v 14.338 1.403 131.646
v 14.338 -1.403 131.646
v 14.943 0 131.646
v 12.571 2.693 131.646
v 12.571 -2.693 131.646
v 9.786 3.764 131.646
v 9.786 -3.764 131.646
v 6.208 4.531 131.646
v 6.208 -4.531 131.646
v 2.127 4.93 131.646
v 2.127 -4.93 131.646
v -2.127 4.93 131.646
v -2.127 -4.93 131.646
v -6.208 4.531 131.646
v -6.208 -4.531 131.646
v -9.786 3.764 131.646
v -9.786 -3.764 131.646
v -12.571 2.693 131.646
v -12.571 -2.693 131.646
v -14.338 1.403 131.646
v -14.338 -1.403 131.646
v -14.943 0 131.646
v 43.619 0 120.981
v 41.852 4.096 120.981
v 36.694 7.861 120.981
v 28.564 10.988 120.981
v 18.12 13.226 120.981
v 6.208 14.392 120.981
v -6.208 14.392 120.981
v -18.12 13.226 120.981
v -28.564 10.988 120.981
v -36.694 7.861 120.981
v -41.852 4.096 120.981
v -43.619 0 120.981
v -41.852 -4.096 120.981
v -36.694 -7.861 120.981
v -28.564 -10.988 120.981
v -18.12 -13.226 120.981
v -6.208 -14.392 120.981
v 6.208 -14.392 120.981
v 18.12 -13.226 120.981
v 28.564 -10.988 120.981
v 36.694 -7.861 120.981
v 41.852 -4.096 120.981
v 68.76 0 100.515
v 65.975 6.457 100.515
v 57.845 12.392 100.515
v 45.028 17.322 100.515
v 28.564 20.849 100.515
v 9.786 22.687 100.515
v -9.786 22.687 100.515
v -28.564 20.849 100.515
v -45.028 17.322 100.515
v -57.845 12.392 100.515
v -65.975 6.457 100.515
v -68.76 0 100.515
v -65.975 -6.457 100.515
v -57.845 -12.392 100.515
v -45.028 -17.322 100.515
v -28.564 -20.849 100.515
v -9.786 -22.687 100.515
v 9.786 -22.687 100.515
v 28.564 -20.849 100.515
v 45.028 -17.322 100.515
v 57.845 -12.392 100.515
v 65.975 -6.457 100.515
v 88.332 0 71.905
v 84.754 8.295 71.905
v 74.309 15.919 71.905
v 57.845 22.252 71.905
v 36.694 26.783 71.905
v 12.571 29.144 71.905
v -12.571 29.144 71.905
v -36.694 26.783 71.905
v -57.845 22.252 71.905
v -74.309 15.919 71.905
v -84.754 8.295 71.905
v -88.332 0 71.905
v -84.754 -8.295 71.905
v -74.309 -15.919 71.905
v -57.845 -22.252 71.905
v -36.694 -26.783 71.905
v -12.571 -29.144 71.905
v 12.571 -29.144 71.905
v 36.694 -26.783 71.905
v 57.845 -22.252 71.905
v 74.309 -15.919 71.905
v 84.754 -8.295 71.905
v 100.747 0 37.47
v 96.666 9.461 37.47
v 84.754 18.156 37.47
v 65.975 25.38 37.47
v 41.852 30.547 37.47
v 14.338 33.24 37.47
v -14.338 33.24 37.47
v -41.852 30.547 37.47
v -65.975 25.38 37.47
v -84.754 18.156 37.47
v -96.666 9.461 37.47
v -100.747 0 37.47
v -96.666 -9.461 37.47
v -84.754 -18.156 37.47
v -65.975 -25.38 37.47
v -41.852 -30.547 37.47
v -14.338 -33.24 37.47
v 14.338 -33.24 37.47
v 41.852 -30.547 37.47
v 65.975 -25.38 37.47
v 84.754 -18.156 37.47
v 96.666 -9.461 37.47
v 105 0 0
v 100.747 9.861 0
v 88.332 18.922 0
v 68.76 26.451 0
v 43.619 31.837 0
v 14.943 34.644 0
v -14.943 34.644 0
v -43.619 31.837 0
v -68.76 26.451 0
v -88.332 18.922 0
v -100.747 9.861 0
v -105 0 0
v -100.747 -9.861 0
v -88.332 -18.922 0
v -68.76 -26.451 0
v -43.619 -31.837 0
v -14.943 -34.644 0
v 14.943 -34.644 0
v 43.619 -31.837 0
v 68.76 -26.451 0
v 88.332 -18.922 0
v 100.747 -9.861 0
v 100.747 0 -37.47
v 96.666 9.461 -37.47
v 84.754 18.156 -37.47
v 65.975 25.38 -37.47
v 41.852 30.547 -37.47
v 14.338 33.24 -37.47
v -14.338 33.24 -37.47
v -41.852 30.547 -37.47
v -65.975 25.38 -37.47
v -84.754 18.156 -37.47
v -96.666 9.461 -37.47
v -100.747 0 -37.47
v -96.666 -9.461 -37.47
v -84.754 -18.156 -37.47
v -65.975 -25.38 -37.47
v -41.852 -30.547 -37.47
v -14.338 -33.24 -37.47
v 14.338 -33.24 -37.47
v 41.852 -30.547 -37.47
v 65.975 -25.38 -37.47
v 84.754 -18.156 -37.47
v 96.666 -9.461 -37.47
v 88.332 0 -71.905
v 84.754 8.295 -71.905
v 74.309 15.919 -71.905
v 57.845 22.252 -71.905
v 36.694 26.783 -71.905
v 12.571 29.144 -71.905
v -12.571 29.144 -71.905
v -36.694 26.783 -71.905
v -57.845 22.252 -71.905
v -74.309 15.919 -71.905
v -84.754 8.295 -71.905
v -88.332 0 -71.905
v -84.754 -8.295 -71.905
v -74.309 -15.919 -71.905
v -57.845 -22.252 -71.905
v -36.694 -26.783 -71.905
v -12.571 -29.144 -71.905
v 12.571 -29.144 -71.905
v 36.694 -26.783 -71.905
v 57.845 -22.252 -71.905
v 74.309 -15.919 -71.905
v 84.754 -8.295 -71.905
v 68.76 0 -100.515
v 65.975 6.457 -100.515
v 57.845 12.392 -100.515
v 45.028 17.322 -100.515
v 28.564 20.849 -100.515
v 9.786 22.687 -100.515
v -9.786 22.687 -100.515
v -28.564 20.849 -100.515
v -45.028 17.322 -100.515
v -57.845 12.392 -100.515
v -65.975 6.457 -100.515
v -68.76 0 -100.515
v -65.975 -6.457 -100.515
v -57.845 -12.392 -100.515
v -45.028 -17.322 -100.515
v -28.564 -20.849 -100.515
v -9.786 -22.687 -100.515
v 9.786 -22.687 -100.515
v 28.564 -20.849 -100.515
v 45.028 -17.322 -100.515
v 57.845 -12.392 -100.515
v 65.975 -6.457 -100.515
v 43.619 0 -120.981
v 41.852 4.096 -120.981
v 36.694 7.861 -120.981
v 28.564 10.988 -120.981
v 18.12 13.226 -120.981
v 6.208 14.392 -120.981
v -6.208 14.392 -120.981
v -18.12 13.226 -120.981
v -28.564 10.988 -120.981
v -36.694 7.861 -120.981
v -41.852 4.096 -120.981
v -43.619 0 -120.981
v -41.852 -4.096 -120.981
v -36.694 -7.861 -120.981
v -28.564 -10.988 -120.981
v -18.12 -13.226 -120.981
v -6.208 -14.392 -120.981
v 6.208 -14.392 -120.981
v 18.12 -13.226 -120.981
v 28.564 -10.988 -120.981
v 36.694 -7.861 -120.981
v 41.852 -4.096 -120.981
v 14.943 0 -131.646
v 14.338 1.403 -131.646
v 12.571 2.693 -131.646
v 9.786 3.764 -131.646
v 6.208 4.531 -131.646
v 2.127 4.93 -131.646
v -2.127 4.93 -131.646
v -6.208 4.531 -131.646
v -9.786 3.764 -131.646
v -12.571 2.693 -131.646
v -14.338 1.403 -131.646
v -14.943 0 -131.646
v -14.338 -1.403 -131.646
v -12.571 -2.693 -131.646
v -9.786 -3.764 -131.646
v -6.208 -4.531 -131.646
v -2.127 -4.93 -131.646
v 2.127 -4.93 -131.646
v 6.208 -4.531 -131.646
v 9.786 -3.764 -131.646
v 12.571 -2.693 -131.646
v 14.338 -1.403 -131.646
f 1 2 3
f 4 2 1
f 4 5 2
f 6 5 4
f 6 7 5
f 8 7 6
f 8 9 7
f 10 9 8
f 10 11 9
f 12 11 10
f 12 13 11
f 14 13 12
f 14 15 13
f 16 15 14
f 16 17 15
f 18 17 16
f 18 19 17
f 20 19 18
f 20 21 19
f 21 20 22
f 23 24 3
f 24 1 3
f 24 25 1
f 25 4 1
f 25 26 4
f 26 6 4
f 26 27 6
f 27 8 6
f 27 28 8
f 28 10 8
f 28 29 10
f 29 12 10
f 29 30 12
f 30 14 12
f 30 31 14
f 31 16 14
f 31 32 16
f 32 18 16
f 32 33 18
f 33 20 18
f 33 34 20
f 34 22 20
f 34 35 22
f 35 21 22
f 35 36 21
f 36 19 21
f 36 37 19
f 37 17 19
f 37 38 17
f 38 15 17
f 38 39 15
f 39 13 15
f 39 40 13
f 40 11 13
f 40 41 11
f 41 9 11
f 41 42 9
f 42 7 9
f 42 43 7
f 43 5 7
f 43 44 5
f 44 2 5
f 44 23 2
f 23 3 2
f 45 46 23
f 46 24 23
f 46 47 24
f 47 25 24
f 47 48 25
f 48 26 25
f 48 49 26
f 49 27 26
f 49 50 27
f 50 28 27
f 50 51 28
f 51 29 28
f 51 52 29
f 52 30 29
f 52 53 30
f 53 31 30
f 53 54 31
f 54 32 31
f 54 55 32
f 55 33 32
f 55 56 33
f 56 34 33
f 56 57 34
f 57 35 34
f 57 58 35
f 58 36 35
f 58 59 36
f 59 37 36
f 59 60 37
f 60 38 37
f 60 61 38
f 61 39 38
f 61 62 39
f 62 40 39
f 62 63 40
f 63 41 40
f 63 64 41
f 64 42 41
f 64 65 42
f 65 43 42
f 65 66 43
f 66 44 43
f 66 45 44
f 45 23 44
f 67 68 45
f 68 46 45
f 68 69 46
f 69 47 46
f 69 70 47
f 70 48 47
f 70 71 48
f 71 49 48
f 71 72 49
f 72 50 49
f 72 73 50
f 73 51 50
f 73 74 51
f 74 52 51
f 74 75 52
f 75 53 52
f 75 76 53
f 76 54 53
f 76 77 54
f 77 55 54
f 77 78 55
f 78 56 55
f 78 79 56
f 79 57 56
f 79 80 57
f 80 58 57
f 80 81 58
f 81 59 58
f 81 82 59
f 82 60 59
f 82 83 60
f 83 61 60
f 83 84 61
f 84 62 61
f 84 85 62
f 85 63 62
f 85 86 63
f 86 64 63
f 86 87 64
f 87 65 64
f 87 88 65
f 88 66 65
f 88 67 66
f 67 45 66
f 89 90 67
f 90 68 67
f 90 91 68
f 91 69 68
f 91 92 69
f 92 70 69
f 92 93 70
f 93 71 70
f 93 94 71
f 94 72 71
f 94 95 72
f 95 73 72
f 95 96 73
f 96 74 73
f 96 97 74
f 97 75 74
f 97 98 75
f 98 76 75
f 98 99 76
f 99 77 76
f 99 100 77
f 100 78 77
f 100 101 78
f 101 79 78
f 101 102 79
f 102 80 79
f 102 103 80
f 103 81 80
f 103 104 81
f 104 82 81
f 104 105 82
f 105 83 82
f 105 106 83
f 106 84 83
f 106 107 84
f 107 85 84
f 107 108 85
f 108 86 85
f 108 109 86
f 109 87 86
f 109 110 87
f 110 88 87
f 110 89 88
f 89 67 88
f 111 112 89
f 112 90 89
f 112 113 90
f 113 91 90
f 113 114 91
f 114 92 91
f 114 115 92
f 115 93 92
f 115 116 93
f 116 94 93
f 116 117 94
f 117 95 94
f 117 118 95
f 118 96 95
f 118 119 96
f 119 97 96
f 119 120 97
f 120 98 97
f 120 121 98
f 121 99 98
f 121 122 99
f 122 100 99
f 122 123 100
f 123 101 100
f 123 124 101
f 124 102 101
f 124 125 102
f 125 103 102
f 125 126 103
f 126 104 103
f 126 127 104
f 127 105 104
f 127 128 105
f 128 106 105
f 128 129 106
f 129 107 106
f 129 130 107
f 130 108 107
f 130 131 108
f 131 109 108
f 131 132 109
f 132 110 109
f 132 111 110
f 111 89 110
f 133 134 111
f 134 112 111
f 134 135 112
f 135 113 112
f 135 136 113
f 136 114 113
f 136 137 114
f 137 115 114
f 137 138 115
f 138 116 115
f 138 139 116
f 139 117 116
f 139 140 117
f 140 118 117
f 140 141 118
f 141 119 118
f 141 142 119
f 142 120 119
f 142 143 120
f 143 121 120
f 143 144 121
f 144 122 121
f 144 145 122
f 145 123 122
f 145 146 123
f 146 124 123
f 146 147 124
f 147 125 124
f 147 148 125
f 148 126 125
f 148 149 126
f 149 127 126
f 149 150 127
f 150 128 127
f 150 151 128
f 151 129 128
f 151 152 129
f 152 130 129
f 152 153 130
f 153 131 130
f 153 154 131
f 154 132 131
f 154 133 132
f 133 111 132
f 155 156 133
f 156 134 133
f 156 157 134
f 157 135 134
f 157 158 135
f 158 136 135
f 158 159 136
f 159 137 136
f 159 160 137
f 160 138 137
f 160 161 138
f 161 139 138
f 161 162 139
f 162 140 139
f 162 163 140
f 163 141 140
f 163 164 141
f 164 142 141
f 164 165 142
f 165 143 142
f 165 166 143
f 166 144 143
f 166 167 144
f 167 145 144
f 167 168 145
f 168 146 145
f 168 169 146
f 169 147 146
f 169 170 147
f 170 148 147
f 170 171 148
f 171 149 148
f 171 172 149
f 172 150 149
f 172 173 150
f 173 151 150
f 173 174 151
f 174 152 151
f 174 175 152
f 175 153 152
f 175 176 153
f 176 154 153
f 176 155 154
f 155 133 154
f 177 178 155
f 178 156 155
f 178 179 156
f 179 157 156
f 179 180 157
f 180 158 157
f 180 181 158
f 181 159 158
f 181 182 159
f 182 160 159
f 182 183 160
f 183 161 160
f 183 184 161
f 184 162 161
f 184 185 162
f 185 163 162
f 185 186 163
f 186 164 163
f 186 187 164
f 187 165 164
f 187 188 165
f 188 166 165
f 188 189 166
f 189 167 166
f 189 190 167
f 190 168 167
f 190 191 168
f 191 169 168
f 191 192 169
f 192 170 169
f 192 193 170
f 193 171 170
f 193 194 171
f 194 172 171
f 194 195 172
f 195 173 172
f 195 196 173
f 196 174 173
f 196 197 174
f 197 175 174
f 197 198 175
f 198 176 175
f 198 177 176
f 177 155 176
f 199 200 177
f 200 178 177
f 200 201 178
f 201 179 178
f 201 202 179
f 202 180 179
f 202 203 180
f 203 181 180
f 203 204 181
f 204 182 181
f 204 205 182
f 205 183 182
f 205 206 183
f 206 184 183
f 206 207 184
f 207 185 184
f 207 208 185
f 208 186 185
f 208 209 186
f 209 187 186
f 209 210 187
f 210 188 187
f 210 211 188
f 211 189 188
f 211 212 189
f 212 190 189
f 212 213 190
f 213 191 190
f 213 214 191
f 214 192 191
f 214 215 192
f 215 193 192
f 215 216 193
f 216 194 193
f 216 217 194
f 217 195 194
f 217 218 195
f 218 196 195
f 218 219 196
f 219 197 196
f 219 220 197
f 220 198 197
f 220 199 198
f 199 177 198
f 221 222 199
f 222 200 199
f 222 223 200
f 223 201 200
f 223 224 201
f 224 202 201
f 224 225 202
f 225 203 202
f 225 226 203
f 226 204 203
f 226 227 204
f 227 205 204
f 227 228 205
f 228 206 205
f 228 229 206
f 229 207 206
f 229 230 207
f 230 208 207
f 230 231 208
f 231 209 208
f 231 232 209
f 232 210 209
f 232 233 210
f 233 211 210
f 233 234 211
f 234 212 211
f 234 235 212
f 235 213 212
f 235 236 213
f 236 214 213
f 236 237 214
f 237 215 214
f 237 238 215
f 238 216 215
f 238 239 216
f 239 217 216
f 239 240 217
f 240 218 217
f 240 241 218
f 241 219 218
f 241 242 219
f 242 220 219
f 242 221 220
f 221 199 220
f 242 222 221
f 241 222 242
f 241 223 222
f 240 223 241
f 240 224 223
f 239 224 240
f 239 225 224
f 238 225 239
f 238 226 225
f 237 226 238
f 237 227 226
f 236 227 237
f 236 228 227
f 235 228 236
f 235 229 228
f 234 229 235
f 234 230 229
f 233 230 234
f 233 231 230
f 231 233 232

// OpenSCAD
// Generated by SolidPython 1.0.1 on 2020-07-29 00:46:51


scale(v = [15, 5, 19]) {
	sphere(r = 7);
}
/***********************************************
*********      SolidPython code:      **********
************************************************
 
# import packages: SolidPython
from solid import *
from solid.utils import *
from itertools import chain, combinations, permutations


class Resize:

    def __init__(self, scad_file):
        self.scad_file = scad_file
        #self.scad_file = import_scad(scad_file)
        # cone/cylinder param:
        self.r1 = 0
        self.r2 = 0
        self.h = 0
        # rectangular prism param:
        self.w = 0
        self.l = 0
        # ellipse param:
        self.r = 0

    # import OpenScad code (file name corresponds to shape)


    # classify shape + parameters
    def assign(self, param1, param2, param3):
        if self.scad_file == 'cone.scad':
            self.r1 = param1
            self.r2 = param2
            self.h = param3
        elif self.scad_file == 'cylinder.scad':
            self.r1 = param1
            self.r2 = param2
            self.h = param3
        elif self.scad_file == 'rectangularPrism.scad':
            self.h = param1
            self.l = param2
            self.w = param3
        else:
            self.r = param1
            self.h = param2

    # resize parameters
    def iterate(self):
        x = range(3, 20, 2)
        i = 1
        if self.scad_file == 'cone.scad':
            tempList = list(permutations(x, 2))
            for temp in tempList:
                param1 = temp[0]
                param2 = temp[1]
                filepath = 'produced_scad_files/' + 'cone' + str(param1) + '_' + str(param2) + '_' + '.scad'
                scad_render_to_file(cylinder(h=param1, r1=param2, r2=0), filepath)

        elif self.scad_file == 'cylinder.scad':
            tempList = list(permutations(x, 3))
            for temp in tempList:
                param1 = temp[0]
                param2 = temp[1]
                filepath = 'produced_scad_files/' + 'cylinder' + str(param1) + '_' + str(param2) + '_' + '.scad'
                scad_render_to_file(cylinder(h=param1, r1=param2, r2=param2), filepath)

        elif self.scad_file == 'rectangularPrism.scad':
            tempList = list(permutations(x, 3))
            for temp in tempList:
                param1 = temp[0]
                param2 = temp[1]
                param3 = temp[2]
                filepath = 'produced_scad_files/' + 'rectangularPrism' + str(param1) + '_' + str(param2) + '_' + str(
                    param3) + '.scad'
                scad_render_to_file(cube(size=(param1, param2, param3)), filepath)

        elif self.scad_file == 'ellipse.scad':
            tempList = list(permutations(x, 4))
            for temp in tempList:
                param1 = temp[0]
                param2 = temp[1]
                param3 = temp[2]
                param4 = temp[3]
                filepath = 'produced_scad_files/' + 'ellipse' + str(param1) + '_' + str(param2) + '_' + str(param3) + '_' + str(param4) + '.scad'
                scad_render_to_file(scale([param1, param2, param3])(sphere(r=param4)), filepath)

    def render_to_scadfile(self):
        scad_render_to_file(scad, 'example.scad') 
 
************************************************/
